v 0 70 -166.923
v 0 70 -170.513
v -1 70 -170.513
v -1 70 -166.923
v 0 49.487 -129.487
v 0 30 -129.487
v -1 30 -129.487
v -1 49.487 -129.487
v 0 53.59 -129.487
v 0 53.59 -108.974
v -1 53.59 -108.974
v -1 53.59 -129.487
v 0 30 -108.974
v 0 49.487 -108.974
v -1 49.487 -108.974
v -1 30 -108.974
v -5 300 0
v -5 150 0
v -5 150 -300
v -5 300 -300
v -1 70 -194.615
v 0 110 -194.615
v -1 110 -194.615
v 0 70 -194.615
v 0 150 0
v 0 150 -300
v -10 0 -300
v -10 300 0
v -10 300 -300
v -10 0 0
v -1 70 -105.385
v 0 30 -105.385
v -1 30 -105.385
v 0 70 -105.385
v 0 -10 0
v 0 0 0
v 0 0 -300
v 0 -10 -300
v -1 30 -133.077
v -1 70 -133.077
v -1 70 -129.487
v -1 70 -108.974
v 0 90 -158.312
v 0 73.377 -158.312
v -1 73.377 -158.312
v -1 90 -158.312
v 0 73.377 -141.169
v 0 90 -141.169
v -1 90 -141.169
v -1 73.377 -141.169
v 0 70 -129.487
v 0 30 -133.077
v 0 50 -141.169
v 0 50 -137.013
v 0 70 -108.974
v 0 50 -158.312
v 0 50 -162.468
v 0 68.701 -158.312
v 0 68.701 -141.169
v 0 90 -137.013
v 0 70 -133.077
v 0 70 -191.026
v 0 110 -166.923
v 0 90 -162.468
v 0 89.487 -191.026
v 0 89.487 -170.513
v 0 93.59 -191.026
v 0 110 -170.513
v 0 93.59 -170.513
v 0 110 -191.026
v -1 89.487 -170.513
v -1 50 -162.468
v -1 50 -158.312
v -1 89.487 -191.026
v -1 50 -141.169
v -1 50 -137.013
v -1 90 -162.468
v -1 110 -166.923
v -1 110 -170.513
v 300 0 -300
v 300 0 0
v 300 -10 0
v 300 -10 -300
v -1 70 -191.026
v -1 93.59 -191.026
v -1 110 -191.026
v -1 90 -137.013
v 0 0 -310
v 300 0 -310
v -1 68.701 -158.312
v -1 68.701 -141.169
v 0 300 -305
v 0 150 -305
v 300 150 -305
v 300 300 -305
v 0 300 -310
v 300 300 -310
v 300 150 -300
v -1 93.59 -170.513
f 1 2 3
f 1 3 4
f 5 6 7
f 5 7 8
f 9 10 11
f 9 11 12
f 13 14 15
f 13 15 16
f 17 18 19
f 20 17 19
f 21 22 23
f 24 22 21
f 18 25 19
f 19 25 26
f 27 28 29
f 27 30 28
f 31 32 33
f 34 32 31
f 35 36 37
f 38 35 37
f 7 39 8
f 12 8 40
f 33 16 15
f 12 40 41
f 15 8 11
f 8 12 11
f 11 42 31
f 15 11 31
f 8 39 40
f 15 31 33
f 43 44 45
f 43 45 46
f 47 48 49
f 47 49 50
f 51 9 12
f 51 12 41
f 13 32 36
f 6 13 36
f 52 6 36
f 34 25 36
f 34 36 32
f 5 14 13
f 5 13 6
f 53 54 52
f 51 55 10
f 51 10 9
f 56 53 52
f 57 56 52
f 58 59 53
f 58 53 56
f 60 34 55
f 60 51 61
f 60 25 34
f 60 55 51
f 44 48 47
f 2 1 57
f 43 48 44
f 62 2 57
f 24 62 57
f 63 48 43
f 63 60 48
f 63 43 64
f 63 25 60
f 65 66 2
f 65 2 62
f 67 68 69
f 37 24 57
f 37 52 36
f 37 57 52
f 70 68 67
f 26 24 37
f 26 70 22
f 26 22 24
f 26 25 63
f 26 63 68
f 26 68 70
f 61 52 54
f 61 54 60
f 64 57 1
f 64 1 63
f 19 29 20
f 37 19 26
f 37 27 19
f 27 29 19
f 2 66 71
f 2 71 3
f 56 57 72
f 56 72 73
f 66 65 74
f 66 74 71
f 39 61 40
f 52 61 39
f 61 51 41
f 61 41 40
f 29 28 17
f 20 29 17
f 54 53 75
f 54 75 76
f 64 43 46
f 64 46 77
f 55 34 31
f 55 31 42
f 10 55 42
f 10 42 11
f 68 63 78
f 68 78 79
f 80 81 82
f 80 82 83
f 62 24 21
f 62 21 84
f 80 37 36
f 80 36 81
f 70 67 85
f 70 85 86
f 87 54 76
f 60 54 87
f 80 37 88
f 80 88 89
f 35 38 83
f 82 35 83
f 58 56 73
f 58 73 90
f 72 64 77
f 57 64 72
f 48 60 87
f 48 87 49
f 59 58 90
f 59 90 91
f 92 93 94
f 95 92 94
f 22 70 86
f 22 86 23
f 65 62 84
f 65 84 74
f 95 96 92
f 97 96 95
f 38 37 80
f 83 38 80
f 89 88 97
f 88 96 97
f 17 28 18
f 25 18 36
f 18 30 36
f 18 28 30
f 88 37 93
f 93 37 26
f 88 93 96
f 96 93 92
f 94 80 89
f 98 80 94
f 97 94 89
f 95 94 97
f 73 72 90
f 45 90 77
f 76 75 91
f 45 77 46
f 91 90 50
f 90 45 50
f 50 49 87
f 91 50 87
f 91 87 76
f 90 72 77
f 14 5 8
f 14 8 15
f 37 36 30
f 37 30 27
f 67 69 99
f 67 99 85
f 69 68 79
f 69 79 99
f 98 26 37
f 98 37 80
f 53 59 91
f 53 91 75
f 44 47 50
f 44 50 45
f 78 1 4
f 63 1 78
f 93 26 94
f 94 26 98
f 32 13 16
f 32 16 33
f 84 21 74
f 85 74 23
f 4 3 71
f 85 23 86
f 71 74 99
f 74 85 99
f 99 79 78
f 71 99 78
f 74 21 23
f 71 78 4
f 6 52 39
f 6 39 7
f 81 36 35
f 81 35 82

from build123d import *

# Parameters (mm, degrees)
SKETCH1_W           = 300
SKETCH1_H           = 300
BOSS_EXTRUDE1_DEPTH = 10
SKETCH2_W           = 300
SKETCH2_H           = 150
BOSS_EXTRUDE2_DEPTH = 10
BOSS_EXTRUDE3_START = -300
SKETCH3_W           = 300
SKETCH3_H           = 150
BOSS_EXTRUDE3_DEPTH = 10
SKETCH4_W           = 5
SKETCH4_H           = 300
SKETCH4_W_2         = 300
SKETCH4_H_2         = 5
BOSS_EXTRUDE4_DEPTH = 150
CUT_EXTRUDE1_DEPTH  = 1


with BuildPart() as part:
    # Sketch1 → Boss-Extrude1 (new body)
    with BuildSketch(Plane(origin=(0, 0, 0), x_dir=(1, 0, 0), z_dir=(0, 1, 0))):
        with Locations((150, 150)):
            Rectangle(SKETCH1_W, SKETCH1_H)
    extrude(amount=-BOSS_EXTRUDE1_DEPTH)


with BuildPart() as body_2:
    # Sketch2 → Boss-Extrude2 (new body)
    with BuildSketch(Plane(origin=(0, 0, 0), x_dir=(0, 0, -1), z_dir=(1, 0, 0))):
        with Locations((150, 75)):
            Rectangle(SKETCH2_W, SKETCH2_H)
    extrude(amount=-BOSS_EXTRUDE2_DEPTH)



with BuildPart() as body_3:
    # Sketch3 → Boss-Extrude3 (new body)
    with BuildSketch(Plane.XY.offset(BOSS_EXTRUDE3_START)):
        with Locations((150, 75)):
            Rectangle(SKETCH3_W, SKETCH3_H)
    extrude(amount=-BOSS_EXTRUDE3_DEPTH)


with BuildPart() as body_2_1:
    add(body_2.part)

    add(body_3.part)  # Boss-Extrude4 merges body 3
    # Sketch4 → Boss-Extrude4 (add)
    with BuildSketch(Plane(origin=(0, 150, 0), x_dir=(1, 0, 0), z_dir=(0, 1, 0))):
        with Locations((-7.5, 150)):
            Rectangle(SKETCH4_W, SKETCH4_H)
        with Locations((150, 307.5)):
            Rectangle(SKETCH4_W_2, SKETCH4_H_2)
    extrude(amount=BOSS_EXTRUDE4_DEPTH)

    # Sketch5 → Cut-Extrude1 (cut)
    with BuildSketch(Plane(origin=(0, 0, 0), x_dir=(0, 0, -1), z_dir=(1, 0, 0))):
        Polygon((137.012987013, 50), (137.012987013, 90), (141.168831169, 90), (141.168831169, 73.376623377), (158.311688312, 73.376623377), (158.311688312, 90), (162.467532468, 90), (162.467532468, 50), (158.311688312, 50), (158.311688312, 68.701298701), (141.168831169, 68.701298701), (141.168831169, 50), align=None)
        Polygon((105.384615385, 70), (108.974358974, 70), (108.974358974, 53.58974359), (129.487179487, 53.58974359), (129.487179487, 70), (133.076923077, 70), (133.076923077, 30), (129.487179487, 30), (129.487179487, 49.487179487), (108.974358974, 49.487179487), (108.974358974, 30), (105.384615385, 30), align=None)
        Polygon((166.923076923, 110), (170.512820513, 110), (170.512820513, 93.58974359), (191.025641026, 93.58974359), (191.025641026, 110), (194.615384615, 110), (194.615384615, 70), (191.025641026, 70), (191.025641026, 89.487179487), (170.512820513, 89.487179487), (170.512820513, 70), (166.923076923, 70), align=None)
    extrude(amount=-CUT_EXTRUDE1_DEPTH, mode=Mode.SUBTRACT)


solid = Compound([part.part, body_2_1.part])
